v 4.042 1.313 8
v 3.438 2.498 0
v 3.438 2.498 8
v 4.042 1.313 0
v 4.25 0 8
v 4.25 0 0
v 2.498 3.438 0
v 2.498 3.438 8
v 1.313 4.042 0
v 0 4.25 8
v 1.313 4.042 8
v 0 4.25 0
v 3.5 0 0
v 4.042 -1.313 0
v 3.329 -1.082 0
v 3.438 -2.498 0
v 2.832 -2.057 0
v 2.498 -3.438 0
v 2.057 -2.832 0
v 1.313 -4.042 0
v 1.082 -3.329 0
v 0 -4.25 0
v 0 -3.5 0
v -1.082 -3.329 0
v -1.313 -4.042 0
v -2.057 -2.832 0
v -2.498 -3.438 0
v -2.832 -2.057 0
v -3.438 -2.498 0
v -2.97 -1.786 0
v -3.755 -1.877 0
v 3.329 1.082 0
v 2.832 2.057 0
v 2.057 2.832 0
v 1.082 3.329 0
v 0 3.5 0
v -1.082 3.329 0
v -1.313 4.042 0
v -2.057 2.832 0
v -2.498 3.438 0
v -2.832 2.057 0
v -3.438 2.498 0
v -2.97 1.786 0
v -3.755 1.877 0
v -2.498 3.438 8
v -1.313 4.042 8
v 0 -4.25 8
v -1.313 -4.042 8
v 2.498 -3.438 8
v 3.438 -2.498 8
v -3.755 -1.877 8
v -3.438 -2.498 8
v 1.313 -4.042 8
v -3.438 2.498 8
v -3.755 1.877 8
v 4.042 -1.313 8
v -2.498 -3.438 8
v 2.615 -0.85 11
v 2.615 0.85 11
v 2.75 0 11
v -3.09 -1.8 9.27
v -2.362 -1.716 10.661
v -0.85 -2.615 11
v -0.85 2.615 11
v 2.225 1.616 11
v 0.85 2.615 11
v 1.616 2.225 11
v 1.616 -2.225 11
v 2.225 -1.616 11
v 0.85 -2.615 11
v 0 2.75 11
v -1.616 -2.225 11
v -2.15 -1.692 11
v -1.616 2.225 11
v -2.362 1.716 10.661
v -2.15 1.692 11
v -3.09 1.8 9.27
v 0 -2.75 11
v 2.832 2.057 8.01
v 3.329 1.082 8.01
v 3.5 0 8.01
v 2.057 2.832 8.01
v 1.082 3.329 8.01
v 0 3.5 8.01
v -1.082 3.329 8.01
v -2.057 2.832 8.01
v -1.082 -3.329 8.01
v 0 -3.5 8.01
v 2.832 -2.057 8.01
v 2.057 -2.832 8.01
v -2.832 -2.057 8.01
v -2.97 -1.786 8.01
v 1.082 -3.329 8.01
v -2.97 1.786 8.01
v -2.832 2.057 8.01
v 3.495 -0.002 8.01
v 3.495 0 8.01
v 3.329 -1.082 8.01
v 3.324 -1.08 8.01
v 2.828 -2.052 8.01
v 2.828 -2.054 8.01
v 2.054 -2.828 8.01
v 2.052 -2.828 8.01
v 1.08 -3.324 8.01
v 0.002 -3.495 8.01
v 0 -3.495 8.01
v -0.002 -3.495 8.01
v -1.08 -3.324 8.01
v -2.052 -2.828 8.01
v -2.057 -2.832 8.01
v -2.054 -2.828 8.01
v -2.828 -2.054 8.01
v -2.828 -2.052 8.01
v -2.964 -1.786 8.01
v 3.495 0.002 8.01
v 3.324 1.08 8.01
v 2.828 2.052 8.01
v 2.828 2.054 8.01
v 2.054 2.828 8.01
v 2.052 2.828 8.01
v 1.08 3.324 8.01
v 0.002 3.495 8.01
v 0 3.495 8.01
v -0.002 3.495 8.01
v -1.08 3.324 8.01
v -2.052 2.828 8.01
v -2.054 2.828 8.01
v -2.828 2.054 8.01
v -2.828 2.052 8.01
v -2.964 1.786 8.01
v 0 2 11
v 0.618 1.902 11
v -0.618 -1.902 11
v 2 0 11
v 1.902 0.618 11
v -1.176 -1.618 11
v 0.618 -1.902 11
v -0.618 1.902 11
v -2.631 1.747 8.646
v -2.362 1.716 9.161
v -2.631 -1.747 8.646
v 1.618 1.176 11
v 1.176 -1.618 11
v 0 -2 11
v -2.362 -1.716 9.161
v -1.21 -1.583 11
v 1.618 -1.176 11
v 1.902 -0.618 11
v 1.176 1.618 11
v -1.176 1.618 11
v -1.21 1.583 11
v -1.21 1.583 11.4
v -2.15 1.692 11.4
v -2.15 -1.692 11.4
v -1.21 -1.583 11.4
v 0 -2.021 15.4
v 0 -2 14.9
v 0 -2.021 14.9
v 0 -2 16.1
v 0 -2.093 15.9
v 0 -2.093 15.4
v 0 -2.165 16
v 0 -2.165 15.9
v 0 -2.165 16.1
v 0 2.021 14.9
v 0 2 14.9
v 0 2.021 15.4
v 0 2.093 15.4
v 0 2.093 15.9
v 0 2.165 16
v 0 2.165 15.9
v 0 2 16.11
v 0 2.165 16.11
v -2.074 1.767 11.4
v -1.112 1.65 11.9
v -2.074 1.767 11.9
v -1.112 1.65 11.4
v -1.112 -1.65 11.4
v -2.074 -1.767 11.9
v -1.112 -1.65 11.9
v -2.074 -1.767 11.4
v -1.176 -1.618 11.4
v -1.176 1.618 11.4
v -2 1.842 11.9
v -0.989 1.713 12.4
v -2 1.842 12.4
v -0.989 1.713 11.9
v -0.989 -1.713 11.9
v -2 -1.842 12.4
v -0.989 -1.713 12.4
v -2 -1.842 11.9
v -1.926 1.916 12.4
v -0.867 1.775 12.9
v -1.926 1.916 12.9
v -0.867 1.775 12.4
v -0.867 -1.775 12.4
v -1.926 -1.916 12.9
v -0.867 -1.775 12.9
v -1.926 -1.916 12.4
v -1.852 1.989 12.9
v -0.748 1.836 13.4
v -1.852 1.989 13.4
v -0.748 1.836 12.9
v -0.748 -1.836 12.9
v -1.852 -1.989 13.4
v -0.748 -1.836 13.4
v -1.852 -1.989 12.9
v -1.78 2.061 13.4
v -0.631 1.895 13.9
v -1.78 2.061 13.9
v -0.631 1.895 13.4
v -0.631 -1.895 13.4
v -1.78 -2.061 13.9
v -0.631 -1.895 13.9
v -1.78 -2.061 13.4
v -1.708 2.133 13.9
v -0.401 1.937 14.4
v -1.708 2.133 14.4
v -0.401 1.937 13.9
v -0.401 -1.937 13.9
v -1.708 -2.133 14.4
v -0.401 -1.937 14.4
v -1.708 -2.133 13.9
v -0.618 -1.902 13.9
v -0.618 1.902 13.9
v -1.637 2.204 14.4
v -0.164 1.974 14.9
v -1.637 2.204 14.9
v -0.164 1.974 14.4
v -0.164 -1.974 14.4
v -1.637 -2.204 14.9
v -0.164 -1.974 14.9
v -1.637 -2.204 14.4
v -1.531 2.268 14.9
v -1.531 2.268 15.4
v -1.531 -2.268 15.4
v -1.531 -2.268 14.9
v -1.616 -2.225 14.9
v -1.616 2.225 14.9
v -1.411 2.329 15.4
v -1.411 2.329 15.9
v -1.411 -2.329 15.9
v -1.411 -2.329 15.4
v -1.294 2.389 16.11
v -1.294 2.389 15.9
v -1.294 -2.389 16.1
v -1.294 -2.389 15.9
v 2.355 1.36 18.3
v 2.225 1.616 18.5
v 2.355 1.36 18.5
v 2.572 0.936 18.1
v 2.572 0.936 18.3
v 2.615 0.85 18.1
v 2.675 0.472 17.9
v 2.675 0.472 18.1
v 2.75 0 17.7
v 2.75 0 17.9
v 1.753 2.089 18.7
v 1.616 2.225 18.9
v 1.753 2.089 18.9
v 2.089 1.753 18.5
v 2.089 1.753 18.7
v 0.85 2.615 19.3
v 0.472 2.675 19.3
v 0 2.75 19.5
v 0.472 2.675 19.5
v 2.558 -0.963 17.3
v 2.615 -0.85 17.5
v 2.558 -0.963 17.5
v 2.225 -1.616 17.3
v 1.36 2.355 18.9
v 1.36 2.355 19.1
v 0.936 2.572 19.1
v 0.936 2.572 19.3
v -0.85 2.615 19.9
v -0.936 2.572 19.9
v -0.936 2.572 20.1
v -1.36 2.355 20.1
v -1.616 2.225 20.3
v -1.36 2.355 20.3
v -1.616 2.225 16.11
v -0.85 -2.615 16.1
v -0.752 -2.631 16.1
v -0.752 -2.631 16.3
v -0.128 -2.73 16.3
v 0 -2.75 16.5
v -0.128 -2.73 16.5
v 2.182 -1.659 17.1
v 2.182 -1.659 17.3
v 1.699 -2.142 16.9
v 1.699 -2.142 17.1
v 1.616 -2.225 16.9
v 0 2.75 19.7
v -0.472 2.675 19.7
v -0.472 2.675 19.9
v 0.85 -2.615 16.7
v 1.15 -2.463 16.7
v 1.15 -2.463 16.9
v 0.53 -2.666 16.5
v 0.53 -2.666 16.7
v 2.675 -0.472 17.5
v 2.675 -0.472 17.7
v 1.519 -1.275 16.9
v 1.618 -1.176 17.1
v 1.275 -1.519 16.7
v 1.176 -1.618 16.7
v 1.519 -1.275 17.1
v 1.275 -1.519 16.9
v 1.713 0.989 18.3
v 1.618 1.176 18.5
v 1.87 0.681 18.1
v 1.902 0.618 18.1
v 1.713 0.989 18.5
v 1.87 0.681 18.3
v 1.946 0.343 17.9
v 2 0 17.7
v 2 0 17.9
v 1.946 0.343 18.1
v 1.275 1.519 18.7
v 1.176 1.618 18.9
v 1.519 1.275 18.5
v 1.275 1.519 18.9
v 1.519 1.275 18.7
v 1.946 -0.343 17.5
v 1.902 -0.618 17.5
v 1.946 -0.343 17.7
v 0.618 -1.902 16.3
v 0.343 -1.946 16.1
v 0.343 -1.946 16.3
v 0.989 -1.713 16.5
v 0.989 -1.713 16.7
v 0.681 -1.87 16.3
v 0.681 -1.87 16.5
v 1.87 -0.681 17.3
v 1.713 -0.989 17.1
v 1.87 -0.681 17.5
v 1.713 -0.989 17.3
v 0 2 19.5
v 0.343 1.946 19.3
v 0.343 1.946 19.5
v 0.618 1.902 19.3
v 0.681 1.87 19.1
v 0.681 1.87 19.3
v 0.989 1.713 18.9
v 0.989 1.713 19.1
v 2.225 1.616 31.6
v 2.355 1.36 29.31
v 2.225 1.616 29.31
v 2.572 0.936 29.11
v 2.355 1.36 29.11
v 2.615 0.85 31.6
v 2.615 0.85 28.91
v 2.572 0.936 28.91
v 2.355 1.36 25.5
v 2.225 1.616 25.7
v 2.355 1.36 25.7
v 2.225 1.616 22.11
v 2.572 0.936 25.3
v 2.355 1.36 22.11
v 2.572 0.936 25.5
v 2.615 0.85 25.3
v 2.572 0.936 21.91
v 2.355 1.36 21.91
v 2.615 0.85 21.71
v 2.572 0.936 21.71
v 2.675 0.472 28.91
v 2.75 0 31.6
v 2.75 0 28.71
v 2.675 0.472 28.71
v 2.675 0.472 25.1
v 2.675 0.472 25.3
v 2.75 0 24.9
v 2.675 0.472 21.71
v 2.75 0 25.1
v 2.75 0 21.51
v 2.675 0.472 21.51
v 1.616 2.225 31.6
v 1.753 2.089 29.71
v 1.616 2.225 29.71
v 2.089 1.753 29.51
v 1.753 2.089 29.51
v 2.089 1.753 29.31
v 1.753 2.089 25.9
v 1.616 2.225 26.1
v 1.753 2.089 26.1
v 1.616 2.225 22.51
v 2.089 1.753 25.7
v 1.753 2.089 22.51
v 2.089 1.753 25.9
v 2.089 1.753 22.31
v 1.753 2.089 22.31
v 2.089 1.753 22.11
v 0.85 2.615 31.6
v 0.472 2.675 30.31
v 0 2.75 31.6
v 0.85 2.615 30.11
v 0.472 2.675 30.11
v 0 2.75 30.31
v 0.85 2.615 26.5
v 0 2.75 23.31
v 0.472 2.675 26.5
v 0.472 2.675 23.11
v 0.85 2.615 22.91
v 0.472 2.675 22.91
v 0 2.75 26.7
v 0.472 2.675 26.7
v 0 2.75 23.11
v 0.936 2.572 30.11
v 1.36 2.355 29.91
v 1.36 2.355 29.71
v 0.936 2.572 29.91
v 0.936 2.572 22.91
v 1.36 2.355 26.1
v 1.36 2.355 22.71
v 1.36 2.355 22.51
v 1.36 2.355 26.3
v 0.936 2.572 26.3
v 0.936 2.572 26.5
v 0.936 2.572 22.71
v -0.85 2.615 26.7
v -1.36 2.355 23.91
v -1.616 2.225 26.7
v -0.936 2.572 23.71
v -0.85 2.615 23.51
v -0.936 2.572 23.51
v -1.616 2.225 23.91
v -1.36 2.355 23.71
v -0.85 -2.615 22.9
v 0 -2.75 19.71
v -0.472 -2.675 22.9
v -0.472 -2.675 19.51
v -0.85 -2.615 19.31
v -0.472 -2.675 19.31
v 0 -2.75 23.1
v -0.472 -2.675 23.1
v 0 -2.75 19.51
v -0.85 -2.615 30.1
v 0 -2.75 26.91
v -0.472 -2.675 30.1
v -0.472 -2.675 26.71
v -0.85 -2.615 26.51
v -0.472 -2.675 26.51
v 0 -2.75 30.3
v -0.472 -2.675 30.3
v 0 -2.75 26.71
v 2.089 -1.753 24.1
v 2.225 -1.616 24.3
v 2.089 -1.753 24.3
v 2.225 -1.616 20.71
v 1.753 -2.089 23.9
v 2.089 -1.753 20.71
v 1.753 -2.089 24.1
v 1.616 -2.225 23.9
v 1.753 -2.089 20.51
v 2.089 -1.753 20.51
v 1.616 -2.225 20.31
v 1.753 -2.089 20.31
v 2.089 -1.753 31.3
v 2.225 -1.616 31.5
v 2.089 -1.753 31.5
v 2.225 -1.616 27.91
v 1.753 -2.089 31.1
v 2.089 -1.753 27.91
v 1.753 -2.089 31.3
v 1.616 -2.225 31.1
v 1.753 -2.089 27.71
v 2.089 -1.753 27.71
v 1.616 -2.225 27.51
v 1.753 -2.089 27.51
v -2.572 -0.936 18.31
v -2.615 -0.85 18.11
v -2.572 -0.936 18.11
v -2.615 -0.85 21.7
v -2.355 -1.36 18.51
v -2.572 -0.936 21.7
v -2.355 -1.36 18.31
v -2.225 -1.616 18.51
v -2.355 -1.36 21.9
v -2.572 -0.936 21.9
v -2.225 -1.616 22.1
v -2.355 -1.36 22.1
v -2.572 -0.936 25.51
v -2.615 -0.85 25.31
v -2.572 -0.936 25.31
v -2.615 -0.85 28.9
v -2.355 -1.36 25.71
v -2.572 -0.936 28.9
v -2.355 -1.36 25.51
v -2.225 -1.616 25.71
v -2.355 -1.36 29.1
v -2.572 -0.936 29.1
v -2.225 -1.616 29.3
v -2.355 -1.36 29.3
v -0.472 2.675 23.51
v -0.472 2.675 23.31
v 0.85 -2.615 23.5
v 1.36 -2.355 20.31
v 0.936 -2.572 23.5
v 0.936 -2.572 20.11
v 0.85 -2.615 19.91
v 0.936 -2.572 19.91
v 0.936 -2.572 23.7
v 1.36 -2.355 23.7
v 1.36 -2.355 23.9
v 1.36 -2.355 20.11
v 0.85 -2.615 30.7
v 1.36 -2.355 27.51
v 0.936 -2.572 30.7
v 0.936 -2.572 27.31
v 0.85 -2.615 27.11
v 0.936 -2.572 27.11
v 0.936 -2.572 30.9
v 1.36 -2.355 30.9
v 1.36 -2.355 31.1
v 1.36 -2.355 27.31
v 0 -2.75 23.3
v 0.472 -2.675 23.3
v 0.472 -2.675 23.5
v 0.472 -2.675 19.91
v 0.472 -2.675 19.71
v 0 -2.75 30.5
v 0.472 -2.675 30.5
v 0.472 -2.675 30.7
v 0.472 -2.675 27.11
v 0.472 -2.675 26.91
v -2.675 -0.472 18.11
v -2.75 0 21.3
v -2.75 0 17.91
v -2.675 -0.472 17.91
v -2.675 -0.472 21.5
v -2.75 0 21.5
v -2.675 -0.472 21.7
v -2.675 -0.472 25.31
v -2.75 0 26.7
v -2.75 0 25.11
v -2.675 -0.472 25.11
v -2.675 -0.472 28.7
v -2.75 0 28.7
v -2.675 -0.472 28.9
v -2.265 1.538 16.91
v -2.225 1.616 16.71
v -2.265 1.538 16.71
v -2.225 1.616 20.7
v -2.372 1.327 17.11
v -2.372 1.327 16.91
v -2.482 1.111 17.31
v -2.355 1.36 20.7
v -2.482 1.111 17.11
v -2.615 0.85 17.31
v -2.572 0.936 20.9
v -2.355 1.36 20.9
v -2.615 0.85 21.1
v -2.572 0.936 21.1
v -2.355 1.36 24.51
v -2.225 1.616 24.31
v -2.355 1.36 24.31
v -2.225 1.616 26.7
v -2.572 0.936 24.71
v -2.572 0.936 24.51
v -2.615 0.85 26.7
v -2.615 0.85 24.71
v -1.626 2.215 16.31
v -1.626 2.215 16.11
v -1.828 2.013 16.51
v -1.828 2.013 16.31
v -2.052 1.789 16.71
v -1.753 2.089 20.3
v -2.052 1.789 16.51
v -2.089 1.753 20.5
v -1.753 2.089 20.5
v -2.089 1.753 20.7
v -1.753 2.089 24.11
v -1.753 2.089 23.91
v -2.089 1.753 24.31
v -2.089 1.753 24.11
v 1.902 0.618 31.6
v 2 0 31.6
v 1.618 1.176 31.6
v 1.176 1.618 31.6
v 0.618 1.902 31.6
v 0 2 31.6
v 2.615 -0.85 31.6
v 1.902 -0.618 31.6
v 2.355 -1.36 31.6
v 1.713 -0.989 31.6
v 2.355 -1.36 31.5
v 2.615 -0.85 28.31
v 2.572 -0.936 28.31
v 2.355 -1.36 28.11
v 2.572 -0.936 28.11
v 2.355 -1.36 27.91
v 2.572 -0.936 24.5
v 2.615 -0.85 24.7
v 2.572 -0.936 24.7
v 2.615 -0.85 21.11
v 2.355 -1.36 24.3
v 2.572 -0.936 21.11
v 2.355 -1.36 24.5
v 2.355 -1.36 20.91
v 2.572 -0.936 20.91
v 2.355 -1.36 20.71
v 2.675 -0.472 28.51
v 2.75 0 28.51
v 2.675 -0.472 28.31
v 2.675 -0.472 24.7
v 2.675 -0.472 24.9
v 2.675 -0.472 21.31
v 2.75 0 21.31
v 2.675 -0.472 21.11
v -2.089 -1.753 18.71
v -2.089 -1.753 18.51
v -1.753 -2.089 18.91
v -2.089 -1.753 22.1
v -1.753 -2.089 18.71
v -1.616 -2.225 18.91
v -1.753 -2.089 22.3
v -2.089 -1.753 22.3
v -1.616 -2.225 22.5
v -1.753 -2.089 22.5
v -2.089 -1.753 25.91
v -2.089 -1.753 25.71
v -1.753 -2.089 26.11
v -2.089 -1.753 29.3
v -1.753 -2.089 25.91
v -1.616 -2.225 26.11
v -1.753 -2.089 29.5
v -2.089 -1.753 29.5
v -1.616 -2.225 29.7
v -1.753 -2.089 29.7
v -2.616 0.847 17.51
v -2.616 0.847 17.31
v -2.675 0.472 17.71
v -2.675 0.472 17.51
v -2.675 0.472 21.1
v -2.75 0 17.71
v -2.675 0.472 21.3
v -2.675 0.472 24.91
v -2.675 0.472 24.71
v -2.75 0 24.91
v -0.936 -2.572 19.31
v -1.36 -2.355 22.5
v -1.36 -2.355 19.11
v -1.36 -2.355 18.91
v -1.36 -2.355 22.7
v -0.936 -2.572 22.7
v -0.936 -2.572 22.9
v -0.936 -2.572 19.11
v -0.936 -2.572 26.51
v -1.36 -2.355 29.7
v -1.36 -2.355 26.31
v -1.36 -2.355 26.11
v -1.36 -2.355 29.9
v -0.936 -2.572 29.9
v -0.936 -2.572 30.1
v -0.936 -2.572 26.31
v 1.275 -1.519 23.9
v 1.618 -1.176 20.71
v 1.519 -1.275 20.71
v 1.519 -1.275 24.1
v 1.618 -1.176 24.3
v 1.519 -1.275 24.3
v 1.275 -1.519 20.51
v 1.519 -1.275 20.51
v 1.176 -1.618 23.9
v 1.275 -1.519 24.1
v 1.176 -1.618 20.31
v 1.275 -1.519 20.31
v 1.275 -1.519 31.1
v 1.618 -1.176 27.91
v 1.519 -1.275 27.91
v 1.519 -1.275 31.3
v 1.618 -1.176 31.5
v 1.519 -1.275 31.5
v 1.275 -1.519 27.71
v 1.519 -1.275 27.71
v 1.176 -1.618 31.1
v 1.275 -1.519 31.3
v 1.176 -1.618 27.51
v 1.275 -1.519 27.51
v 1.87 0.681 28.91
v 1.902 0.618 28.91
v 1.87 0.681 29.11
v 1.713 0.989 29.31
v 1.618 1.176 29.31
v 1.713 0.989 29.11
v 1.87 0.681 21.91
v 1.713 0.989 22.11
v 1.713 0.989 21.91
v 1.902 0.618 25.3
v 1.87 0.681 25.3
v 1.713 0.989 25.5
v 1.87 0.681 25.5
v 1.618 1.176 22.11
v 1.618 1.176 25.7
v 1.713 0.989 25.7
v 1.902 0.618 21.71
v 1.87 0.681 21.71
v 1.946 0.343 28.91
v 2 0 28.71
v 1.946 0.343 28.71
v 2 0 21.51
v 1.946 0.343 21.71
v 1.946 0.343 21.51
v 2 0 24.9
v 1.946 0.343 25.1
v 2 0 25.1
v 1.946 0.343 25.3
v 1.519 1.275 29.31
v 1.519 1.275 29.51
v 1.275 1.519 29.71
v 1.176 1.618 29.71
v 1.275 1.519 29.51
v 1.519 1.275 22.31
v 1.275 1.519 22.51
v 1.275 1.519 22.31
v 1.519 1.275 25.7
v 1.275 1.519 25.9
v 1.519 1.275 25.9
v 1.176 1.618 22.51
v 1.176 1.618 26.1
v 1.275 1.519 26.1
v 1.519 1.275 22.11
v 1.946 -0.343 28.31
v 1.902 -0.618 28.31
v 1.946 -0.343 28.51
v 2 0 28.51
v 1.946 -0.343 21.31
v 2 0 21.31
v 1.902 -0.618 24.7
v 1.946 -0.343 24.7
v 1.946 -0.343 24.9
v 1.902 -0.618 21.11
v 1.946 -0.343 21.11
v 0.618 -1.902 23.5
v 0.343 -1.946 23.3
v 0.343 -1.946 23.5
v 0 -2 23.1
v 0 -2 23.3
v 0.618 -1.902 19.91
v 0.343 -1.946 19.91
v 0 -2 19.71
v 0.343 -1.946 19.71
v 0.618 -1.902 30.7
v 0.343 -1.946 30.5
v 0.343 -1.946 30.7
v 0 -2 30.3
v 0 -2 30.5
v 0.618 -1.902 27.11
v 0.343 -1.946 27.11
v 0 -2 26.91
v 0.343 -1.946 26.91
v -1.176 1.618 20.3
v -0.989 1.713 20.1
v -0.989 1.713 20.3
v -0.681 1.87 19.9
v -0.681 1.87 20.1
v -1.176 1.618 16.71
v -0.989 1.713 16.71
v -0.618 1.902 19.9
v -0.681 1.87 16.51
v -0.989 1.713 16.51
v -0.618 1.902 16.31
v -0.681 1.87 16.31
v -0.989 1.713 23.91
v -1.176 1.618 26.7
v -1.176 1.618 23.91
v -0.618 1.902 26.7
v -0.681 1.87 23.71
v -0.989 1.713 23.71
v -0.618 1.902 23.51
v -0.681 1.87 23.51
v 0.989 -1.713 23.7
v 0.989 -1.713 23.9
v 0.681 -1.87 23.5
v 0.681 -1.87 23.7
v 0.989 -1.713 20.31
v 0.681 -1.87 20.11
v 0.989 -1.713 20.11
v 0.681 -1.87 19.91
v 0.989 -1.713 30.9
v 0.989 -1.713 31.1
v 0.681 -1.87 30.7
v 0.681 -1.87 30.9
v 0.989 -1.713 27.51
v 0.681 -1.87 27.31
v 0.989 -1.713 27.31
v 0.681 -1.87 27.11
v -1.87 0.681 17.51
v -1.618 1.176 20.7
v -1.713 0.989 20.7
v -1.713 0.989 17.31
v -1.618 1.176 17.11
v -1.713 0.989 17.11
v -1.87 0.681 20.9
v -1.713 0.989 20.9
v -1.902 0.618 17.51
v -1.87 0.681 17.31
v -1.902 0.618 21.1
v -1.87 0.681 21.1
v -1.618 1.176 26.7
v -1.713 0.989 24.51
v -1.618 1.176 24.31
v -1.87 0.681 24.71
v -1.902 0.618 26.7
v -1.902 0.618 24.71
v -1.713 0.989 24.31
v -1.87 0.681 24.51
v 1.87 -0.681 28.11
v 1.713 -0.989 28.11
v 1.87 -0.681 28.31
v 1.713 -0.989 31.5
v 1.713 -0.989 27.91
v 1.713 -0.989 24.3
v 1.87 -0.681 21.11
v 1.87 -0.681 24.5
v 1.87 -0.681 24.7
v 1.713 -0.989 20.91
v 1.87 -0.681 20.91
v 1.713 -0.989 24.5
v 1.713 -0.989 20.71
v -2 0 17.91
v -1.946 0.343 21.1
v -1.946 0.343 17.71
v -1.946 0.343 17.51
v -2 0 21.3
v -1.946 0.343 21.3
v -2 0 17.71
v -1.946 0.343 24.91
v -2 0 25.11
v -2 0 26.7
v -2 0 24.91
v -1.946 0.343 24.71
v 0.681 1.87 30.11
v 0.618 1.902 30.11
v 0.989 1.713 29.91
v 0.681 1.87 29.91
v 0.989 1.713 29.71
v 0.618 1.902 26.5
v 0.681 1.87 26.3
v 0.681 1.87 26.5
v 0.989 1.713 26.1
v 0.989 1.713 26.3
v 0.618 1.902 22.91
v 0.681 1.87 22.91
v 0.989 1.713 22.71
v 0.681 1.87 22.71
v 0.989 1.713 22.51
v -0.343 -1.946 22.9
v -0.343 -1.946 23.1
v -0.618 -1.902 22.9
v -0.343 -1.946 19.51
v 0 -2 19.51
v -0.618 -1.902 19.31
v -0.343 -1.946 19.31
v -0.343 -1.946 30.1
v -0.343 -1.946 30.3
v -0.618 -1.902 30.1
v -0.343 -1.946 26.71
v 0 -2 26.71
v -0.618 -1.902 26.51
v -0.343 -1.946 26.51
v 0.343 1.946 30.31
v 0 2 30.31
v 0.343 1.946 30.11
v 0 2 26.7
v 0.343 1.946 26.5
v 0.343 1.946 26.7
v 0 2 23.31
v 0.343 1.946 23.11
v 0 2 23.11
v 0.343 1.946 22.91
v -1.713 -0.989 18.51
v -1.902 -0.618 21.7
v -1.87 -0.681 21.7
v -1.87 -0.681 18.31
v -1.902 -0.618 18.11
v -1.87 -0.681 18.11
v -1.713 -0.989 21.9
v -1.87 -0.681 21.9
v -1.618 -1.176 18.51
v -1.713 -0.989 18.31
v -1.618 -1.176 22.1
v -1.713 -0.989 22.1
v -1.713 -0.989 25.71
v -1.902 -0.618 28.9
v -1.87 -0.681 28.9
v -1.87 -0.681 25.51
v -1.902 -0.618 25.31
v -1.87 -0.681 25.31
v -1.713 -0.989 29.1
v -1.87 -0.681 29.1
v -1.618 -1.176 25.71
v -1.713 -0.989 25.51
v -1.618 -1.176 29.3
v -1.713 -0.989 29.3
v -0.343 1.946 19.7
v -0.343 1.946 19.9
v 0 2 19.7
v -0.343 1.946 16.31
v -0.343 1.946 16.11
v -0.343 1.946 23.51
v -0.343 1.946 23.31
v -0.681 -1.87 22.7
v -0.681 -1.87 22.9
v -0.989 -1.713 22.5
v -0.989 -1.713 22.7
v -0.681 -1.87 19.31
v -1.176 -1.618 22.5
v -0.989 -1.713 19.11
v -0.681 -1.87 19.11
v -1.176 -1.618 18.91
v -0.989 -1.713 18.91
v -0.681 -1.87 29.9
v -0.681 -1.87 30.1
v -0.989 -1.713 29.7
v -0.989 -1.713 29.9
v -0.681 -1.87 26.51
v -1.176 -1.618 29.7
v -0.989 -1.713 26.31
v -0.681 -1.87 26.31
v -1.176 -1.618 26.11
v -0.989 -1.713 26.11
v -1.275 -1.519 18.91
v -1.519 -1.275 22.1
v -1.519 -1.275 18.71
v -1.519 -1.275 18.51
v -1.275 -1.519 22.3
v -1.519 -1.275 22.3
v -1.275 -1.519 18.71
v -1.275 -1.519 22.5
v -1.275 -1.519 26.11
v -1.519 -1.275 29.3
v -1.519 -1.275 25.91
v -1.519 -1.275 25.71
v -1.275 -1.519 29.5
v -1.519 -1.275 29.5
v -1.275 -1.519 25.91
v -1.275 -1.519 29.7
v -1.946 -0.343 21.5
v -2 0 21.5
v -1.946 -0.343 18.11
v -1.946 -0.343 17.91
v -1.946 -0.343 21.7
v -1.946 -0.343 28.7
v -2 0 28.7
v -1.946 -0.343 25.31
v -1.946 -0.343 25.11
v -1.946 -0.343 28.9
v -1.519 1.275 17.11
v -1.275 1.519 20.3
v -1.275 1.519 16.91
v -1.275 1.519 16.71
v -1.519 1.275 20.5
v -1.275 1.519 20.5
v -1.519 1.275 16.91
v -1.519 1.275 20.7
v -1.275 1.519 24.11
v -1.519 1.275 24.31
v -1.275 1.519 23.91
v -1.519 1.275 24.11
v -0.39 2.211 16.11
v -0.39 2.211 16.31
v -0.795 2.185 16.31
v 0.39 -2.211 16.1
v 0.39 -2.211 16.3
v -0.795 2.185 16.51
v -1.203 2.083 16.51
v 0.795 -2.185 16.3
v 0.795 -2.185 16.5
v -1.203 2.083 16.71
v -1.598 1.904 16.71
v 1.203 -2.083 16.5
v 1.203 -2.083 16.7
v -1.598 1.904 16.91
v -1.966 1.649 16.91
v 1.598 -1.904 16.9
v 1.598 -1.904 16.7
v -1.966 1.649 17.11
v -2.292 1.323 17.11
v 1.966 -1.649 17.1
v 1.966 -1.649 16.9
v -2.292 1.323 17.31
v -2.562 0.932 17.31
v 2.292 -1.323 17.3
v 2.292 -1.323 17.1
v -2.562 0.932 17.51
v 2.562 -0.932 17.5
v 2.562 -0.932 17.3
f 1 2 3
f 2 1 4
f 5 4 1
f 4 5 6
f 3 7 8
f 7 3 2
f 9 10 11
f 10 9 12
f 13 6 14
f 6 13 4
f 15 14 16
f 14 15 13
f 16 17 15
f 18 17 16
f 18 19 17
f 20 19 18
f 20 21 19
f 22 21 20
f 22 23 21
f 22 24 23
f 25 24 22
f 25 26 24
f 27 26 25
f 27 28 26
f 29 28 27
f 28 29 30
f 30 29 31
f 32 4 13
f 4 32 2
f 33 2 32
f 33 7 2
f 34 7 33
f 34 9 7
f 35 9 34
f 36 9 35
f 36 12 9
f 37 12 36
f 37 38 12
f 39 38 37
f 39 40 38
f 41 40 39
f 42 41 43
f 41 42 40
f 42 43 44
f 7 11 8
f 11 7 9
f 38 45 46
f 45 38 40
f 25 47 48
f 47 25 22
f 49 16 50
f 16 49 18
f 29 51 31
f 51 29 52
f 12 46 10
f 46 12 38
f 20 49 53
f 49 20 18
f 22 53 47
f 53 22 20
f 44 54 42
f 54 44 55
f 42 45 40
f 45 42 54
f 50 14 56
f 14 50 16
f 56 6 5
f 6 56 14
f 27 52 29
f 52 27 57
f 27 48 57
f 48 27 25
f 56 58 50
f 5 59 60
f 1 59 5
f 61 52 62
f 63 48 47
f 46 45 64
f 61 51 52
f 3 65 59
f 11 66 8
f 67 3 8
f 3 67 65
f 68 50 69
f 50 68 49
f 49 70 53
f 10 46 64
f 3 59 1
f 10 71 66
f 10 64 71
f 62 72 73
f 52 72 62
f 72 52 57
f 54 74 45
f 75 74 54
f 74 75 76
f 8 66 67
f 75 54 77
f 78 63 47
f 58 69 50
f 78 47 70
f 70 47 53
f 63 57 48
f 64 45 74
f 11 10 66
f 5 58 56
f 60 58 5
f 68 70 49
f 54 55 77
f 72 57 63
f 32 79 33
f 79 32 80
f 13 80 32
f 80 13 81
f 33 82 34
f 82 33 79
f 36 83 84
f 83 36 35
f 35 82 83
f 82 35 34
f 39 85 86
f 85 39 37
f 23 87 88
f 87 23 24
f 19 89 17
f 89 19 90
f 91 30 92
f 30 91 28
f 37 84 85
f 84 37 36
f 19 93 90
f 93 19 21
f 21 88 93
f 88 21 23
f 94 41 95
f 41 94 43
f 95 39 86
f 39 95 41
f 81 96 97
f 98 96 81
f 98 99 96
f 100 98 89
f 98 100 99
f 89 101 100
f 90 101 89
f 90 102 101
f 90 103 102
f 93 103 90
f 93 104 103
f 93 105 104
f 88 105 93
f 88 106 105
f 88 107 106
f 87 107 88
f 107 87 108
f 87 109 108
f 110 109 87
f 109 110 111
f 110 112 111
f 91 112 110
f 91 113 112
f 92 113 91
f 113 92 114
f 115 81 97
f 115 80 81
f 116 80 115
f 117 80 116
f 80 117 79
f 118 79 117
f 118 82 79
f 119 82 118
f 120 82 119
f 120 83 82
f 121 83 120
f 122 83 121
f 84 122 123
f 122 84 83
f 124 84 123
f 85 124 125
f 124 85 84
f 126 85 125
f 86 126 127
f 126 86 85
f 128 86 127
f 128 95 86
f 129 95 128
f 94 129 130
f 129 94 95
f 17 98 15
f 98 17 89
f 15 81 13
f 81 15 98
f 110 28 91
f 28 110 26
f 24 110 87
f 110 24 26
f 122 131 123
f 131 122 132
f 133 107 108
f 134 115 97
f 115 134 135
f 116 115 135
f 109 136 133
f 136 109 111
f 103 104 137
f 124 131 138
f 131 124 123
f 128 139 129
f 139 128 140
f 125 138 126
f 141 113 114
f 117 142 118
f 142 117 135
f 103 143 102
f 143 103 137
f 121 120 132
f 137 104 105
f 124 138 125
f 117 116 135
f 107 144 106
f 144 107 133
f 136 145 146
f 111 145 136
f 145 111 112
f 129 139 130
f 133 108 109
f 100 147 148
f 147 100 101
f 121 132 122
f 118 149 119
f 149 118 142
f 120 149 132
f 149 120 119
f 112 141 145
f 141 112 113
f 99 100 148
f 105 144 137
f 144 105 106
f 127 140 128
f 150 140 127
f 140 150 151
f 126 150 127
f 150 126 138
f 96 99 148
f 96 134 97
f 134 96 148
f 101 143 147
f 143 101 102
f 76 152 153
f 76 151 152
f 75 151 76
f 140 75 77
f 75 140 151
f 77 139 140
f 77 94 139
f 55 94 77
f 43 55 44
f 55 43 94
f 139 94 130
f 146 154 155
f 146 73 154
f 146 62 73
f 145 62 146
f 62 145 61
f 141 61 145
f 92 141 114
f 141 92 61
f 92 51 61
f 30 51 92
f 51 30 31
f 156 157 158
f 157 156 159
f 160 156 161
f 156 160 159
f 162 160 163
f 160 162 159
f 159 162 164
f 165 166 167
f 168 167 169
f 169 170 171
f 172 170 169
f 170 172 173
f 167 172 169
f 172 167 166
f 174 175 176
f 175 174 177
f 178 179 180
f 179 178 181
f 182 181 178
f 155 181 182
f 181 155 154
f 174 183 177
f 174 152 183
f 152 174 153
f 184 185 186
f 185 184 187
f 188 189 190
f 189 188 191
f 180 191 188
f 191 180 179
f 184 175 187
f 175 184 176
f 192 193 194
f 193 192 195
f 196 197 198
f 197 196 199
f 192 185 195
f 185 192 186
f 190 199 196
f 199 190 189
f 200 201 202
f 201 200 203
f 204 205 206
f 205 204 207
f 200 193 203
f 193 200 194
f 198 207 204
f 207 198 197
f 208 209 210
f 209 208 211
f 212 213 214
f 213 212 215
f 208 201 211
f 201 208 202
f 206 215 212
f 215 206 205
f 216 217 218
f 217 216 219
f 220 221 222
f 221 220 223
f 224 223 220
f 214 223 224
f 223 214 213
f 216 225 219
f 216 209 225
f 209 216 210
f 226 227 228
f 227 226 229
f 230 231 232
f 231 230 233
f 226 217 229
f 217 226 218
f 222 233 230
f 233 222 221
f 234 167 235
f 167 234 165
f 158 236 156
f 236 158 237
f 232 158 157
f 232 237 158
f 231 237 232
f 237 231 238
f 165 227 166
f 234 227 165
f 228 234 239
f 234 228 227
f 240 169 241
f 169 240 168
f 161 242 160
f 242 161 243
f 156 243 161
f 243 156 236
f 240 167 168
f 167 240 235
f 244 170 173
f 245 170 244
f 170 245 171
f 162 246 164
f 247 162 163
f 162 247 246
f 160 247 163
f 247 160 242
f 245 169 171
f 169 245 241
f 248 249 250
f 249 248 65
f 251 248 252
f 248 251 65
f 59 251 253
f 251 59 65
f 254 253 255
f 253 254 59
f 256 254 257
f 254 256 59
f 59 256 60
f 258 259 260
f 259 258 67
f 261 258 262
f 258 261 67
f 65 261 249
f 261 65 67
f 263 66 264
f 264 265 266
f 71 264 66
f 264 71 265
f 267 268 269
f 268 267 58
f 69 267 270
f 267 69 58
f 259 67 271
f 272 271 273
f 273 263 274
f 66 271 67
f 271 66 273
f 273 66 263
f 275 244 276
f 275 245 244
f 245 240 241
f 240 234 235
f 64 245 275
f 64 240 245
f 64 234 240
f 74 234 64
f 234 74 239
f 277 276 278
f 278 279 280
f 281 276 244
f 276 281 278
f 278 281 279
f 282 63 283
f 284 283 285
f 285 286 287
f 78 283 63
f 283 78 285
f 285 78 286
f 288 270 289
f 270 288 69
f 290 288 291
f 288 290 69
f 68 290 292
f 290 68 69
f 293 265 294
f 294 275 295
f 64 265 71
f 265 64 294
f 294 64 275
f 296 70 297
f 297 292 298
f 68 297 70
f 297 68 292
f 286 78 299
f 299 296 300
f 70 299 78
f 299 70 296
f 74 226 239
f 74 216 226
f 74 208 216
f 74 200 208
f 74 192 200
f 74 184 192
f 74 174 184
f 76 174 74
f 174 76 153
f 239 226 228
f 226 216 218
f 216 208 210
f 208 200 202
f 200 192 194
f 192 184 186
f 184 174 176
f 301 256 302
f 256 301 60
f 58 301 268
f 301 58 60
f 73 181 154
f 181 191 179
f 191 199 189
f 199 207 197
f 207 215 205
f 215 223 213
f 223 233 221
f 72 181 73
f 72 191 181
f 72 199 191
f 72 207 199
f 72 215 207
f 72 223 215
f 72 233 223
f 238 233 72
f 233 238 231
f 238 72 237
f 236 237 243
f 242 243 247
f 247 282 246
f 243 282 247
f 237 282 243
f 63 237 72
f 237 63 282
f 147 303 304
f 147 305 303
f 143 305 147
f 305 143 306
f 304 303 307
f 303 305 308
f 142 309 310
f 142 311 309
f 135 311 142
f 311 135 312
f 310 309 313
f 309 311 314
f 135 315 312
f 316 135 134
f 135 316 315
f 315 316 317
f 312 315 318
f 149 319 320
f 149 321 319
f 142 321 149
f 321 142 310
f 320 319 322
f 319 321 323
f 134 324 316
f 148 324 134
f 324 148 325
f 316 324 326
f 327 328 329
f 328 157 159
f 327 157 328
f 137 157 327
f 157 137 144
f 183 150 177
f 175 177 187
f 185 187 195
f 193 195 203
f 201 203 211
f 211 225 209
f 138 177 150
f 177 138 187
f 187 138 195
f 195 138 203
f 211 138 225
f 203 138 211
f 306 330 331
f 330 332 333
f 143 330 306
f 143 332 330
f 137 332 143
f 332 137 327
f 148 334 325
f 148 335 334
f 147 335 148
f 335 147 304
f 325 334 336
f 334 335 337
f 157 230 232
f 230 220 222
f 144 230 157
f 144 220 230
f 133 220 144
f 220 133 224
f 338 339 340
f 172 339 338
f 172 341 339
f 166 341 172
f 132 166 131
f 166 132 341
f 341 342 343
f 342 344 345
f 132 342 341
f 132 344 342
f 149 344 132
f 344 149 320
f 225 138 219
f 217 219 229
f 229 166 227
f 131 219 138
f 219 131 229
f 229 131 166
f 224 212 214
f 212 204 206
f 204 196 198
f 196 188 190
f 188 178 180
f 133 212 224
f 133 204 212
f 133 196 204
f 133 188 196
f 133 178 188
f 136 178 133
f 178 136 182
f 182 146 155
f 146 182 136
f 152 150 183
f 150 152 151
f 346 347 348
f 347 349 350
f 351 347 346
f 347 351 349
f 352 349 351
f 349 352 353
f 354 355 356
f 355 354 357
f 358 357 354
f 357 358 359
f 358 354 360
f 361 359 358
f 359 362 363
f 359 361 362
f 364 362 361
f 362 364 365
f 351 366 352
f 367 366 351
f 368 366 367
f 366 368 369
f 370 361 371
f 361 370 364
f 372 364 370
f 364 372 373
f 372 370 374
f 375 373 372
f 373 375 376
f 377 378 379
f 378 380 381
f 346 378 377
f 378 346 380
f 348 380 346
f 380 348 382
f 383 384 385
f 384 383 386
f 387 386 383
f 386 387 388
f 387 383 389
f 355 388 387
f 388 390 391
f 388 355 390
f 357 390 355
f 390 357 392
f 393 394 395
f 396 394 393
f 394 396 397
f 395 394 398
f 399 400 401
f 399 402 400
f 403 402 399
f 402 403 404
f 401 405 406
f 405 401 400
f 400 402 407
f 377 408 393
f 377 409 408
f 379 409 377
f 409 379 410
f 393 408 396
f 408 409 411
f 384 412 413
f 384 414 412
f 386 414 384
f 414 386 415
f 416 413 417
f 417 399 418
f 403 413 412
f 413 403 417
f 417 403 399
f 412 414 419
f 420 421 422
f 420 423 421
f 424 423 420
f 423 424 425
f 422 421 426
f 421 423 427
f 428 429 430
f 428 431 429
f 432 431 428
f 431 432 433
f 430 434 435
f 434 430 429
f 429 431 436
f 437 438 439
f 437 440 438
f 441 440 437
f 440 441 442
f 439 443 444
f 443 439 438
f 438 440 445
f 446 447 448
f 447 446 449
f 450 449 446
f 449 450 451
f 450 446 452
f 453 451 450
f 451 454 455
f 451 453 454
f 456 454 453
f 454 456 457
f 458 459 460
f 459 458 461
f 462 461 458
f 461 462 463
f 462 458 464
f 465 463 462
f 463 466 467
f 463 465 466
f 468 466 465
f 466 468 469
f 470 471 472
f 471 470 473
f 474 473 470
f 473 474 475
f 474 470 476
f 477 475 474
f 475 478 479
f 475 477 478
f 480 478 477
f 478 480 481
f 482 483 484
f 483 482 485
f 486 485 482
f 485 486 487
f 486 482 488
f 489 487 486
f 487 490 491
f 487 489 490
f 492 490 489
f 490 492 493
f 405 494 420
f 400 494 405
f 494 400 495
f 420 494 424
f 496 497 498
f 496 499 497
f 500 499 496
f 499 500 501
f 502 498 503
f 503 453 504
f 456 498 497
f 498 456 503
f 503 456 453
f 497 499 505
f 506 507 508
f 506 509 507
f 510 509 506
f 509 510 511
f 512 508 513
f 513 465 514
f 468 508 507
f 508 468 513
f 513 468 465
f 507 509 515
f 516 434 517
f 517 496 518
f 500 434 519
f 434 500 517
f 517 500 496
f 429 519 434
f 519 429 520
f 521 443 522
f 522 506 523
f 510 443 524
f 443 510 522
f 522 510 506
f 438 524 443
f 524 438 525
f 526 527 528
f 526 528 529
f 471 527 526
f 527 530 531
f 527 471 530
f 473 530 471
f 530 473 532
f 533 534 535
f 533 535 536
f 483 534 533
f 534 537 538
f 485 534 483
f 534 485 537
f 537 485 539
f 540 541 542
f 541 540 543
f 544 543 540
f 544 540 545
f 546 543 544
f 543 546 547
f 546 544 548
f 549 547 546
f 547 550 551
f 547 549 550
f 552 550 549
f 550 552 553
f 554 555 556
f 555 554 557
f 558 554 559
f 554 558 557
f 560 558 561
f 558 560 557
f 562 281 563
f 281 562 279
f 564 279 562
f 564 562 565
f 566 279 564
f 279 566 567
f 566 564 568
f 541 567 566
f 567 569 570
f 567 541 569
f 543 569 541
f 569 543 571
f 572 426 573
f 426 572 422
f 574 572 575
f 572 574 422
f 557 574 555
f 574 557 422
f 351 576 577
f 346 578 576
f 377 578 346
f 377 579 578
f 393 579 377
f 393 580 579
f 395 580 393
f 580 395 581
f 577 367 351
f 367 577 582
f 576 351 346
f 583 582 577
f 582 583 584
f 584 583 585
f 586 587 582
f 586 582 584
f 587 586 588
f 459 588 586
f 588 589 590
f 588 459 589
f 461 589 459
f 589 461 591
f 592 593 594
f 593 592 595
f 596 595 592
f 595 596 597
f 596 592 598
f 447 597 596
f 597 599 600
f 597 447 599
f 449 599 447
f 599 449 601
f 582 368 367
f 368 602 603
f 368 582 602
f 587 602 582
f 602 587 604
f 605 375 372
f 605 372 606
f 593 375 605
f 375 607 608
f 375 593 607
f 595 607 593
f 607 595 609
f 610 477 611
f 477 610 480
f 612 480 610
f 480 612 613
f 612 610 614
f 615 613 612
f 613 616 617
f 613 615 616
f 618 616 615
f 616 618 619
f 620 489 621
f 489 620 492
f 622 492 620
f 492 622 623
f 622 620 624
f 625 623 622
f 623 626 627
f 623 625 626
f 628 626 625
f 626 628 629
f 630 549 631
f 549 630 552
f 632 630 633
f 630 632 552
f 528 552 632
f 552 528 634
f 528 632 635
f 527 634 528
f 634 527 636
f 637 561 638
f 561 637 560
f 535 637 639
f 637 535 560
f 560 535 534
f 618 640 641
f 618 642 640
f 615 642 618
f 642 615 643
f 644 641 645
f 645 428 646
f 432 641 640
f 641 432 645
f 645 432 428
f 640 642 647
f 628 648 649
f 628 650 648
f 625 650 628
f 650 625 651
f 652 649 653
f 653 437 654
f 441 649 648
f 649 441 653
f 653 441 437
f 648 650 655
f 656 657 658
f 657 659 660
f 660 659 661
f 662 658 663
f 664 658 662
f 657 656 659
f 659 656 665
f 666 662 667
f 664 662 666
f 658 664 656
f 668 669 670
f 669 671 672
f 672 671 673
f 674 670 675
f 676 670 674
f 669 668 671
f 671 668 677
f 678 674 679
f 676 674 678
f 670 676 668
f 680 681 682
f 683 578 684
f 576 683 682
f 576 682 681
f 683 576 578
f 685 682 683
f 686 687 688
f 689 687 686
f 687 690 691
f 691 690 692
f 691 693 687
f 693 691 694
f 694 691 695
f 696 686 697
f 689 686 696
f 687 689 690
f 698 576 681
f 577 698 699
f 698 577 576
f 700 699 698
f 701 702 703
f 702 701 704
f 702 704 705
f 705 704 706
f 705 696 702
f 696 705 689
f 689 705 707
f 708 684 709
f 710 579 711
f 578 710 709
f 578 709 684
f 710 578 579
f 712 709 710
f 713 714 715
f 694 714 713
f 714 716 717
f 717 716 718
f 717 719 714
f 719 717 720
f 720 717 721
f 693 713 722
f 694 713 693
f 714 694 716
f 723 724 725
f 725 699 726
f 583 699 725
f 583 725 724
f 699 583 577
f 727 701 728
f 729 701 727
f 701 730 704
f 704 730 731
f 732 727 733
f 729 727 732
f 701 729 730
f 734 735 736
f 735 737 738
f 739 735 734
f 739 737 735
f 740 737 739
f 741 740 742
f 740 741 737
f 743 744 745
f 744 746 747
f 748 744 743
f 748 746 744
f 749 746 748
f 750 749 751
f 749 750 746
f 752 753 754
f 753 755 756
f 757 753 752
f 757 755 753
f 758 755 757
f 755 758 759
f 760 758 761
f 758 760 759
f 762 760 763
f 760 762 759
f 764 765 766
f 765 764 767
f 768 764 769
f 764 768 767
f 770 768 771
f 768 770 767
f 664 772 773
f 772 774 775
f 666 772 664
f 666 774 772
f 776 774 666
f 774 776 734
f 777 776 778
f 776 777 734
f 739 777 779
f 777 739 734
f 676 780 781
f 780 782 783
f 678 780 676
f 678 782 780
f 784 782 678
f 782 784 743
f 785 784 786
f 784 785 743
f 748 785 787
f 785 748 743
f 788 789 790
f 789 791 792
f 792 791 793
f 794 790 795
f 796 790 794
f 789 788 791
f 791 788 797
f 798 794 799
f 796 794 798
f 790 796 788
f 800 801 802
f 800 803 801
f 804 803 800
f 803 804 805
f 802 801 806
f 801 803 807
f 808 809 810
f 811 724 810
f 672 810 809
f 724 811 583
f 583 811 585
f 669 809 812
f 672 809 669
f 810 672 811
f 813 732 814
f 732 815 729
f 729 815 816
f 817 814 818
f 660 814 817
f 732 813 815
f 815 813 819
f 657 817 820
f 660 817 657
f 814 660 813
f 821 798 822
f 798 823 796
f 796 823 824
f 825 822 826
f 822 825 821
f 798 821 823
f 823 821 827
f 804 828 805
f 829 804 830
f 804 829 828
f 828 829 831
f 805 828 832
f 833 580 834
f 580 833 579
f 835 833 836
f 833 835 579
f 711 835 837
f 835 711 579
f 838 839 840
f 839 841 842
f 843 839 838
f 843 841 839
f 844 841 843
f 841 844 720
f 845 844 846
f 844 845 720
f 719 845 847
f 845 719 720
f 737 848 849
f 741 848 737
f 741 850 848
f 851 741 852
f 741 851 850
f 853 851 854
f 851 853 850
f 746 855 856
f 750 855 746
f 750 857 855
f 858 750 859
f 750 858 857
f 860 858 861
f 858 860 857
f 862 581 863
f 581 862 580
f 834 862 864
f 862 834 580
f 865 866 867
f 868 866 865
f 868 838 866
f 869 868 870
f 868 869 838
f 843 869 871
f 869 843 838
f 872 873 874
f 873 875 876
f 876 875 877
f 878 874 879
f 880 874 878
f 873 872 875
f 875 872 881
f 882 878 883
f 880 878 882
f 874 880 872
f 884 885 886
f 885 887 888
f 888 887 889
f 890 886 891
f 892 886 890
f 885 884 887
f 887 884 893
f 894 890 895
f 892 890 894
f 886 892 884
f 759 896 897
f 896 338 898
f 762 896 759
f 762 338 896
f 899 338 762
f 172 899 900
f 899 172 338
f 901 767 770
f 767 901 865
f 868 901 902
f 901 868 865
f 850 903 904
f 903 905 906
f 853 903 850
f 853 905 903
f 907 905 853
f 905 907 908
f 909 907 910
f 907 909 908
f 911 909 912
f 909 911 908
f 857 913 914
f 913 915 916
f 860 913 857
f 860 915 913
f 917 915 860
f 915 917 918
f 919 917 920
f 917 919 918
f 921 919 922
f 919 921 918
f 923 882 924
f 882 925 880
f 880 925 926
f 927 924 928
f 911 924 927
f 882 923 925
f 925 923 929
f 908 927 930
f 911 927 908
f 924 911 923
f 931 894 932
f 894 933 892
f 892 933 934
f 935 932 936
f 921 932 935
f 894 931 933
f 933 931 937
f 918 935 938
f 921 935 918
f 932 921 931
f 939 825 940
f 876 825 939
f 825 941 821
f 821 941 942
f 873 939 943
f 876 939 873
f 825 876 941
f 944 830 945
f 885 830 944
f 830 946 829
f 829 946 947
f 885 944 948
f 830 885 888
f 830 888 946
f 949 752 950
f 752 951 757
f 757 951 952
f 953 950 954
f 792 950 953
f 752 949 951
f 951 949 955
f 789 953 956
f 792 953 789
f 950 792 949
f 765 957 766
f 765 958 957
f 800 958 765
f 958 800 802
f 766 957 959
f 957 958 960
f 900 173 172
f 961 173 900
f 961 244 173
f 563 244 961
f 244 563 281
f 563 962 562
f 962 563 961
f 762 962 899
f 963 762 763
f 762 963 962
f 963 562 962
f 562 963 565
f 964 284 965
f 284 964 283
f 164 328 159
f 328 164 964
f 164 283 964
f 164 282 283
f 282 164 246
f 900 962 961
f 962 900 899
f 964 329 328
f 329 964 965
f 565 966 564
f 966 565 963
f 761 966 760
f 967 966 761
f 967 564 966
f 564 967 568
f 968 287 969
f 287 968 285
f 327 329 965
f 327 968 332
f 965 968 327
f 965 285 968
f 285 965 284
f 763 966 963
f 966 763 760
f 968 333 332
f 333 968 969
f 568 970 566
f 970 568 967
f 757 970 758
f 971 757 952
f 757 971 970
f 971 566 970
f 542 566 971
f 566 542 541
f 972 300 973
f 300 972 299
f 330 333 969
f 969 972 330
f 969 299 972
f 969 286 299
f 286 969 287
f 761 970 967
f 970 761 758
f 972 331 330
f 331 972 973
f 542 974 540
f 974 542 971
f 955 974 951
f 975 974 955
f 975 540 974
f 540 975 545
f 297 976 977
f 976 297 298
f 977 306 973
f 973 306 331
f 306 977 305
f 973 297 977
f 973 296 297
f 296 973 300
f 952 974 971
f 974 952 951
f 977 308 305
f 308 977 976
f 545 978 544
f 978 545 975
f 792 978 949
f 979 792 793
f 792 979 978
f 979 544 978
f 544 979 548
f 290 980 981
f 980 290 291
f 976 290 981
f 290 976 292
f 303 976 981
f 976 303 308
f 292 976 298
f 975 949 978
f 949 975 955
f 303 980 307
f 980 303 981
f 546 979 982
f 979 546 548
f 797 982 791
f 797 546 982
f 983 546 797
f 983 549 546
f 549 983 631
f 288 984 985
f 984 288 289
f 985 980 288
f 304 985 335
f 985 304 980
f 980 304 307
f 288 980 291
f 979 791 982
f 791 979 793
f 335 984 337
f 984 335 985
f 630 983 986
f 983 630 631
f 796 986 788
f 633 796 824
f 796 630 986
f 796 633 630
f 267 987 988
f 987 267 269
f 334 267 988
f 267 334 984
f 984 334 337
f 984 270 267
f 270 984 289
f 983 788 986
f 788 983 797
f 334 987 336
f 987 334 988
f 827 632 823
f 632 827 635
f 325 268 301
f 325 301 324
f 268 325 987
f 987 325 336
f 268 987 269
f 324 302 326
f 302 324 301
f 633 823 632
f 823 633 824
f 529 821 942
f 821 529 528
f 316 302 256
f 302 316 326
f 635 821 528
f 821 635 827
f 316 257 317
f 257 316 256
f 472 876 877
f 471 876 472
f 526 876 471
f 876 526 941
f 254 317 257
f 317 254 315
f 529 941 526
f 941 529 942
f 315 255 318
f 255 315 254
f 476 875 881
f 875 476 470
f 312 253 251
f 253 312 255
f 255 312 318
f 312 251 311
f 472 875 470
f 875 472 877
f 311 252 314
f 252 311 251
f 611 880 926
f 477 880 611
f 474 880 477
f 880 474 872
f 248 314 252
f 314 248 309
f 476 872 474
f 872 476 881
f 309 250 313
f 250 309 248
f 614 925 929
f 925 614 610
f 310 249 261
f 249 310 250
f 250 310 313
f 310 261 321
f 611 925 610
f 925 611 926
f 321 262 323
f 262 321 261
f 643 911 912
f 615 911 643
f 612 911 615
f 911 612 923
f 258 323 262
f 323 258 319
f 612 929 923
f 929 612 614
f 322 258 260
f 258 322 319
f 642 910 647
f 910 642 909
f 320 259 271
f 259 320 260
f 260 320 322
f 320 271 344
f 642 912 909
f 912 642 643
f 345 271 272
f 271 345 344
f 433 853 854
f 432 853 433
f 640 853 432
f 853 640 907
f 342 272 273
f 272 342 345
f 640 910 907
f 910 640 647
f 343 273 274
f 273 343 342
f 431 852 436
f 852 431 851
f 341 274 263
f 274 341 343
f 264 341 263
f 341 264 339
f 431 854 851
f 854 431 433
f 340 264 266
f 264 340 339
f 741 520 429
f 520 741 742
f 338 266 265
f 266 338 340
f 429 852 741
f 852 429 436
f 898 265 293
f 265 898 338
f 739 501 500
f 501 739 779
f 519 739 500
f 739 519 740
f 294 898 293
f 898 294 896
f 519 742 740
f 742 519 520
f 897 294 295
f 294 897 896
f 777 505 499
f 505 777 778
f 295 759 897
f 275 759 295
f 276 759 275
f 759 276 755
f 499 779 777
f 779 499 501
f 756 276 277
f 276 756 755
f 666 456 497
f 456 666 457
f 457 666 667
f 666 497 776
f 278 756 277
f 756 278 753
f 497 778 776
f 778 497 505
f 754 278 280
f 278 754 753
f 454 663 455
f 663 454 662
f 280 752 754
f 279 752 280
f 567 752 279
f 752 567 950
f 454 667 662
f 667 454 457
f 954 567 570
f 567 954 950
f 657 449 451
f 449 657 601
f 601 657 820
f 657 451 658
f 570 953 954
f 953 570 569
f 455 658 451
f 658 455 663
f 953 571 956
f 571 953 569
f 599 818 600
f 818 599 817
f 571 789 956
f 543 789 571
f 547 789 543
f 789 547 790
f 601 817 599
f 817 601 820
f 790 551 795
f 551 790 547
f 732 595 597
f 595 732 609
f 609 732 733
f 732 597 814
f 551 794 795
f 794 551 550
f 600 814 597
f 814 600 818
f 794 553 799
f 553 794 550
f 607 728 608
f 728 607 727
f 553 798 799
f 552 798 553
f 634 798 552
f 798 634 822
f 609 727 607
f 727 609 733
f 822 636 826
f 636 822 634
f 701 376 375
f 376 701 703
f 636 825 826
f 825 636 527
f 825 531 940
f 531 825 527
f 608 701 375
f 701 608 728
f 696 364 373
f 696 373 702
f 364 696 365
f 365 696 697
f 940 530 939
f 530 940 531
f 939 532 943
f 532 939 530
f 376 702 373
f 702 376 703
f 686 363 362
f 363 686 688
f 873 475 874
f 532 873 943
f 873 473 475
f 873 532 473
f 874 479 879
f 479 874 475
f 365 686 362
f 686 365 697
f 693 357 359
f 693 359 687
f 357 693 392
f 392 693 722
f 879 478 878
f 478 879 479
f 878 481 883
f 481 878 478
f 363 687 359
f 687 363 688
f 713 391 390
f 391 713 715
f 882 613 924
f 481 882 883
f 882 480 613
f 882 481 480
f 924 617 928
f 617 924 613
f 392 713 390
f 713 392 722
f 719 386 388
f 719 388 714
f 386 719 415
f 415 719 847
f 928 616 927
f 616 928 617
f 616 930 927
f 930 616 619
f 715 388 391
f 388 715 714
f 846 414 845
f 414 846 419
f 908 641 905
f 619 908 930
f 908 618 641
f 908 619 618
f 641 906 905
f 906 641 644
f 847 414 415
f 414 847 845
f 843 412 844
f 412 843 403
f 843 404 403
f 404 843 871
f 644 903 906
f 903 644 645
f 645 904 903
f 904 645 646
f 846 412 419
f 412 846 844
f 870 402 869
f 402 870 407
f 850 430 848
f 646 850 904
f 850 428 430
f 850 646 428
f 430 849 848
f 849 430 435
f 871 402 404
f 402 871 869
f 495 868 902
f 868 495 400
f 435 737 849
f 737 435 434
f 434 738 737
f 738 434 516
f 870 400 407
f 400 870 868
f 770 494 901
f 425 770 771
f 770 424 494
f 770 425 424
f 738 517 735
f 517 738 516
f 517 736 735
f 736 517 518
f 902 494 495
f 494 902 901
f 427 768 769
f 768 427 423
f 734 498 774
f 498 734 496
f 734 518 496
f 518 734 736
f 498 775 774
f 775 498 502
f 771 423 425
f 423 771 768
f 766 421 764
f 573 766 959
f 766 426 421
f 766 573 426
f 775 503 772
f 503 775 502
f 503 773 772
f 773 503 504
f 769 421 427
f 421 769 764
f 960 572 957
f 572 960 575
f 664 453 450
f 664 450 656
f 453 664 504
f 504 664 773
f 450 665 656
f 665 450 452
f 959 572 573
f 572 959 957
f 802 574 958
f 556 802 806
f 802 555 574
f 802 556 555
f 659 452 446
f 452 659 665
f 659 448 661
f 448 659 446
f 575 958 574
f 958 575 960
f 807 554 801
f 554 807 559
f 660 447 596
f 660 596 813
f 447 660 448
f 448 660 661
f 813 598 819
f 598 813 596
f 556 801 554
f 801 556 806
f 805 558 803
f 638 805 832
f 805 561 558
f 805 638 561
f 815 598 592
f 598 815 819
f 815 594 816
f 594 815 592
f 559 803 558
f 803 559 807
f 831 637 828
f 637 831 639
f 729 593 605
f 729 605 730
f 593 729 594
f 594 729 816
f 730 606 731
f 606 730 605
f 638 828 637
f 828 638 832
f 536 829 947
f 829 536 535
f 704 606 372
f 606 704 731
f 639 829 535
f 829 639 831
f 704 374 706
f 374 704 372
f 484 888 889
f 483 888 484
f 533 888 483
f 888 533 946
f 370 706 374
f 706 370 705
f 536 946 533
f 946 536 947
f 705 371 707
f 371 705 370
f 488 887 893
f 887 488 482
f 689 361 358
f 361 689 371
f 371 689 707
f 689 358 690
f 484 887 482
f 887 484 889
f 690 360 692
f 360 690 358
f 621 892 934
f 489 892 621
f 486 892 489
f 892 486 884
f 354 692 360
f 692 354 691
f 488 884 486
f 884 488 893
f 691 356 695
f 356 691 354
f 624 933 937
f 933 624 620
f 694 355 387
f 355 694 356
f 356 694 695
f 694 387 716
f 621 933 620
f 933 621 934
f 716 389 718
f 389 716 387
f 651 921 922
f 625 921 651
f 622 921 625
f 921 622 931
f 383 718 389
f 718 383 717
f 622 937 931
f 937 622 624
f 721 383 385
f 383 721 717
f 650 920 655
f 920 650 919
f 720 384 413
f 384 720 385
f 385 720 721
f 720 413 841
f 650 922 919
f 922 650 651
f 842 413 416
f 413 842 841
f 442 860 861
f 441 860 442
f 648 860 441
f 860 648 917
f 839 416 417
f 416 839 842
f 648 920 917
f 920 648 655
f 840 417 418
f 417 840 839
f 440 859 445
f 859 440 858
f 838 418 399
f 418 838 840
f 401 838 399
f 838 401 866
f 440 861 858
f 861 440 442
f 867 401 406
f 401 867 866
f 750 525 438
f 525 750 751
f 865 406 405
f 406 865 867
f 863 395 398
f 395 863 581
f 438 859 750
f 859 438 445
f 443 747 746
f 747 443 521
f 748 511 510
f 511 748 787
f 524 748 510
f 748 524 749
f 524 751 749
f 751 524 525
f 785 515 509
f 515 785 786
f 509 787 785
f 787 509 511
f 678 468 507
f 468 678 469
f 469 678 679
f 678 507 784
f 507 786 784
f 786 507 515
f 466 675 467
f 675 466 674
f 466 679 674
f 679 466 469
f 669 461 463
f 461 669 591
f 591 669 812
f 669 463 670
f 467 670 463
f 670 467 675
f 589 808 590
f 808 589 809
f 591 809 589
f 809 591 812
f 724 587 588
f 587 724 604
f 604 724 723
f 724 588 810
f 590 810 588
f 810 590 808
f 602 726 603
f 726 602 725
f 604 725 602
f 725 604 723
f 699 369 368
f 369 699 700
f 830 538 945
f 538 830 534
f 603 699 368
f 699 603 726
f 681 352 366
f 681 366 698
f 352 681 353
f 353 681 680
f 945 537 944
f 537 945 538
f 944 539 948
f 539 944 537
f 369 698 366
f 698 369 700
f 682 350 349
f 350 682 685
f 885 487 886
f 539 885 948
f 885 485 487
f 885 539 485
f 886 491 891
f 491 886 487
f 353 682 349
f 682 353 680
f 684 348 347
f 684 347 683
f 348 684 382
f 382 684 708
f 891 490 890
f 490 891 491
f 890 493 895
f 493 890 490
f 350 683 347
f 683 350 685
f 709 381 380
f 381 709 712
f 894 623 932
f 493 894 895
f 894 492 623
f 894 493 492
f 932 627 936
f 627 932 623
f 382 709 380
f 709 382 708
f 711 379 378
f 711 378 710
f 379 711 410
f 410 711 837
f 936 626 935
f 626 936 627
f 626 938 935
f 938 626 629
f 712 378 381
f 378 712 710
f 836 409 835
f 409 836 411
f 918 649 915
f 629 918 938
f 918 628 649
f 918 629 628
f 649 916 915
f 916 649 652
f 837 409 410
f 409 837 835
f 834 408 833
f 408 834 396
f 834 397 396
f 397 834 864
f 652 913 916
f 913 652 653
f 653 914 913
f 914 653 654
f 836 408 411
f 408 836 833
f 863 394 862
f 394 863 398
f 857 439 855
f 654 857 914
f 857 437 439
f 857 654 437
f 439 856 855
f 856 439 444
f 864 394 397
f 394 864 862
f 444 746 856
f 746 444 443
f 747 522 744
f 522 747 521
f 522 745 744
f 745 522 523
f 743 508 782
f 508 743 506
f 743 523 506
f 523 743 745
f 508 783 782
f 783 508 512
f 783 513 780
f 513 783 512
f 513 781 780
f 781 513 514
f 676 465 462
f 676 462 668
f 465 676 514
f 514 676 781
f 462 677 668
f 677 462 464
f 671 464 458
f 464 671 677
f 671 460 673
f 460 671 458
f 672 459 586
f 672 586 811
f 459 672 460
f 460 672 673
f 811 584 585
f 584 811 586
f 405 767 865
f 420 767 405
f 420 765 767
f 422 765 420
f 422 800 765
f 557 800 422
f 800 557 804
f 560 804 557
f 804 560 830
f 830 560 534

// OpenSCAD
$fn = 20;

difference () {
  union () {
    cylinder(d=8.5, h=8);
    
    translate([0, 0, 8])
    cylinder(d1=8.5, d2=5.5, h=3);
  }
  
  union () {
    translate([0, 0, -1])
    cylinder(d=7, h=9.01);
    
    translate([0, 0, 8])
    cylinder(d1=7, d2=4, h=3);
  }
  
  wedge();
}

difference () {
  translate([0, 0, 11])
  cylinder(d=5.5, h=5);

  translate([0, 0, 10.9])
  cylinder(d=4, h=5.2);
  
  for (i = [0:0.5:5])
    translate([0, 0, 11 + i])
    scale([1, 1 + i/10, 1])
    wedge(0.51);
}

dh = 0.02;
s = 10;
a = 780;

translate([0, 0, 16]) {
  difference () {
    difference () {
      cylinder(d=5.5, h=a*dh);
      
      translate([0, 0, -1])
      cylinder(d=4, h=a*dh + 2);
    }

    render () for(i = [0:s:a])
      translate([0, 0, i*dh])
      rotate(i)
      scale([1, 1.5 + i/180, 1])
      wedge(s*dh + 0.01);

    translate([-5, 0, a * dh - 5 + 0.1])
    cube([5, 5, 5]);
  }
}

module wedge (h = 20) {
  difference () {
    translate([-0, 0, -0.1])
    scale([5, 1, 1])
    cylinder(d=5, h=h, $fn=3);
    
    translate([0, -10, -1])
    cube([20, 20, 22]);
  }
}

module snap (height, wedge_y) {
  difference () {
    cylinder(d=5.5, h=height);
    
    translate([0, 0, -1])
    cylinder(d=4, h=height + 2);

    scale([1, wedge_y, 1])
    wedge ();
  } 
}
